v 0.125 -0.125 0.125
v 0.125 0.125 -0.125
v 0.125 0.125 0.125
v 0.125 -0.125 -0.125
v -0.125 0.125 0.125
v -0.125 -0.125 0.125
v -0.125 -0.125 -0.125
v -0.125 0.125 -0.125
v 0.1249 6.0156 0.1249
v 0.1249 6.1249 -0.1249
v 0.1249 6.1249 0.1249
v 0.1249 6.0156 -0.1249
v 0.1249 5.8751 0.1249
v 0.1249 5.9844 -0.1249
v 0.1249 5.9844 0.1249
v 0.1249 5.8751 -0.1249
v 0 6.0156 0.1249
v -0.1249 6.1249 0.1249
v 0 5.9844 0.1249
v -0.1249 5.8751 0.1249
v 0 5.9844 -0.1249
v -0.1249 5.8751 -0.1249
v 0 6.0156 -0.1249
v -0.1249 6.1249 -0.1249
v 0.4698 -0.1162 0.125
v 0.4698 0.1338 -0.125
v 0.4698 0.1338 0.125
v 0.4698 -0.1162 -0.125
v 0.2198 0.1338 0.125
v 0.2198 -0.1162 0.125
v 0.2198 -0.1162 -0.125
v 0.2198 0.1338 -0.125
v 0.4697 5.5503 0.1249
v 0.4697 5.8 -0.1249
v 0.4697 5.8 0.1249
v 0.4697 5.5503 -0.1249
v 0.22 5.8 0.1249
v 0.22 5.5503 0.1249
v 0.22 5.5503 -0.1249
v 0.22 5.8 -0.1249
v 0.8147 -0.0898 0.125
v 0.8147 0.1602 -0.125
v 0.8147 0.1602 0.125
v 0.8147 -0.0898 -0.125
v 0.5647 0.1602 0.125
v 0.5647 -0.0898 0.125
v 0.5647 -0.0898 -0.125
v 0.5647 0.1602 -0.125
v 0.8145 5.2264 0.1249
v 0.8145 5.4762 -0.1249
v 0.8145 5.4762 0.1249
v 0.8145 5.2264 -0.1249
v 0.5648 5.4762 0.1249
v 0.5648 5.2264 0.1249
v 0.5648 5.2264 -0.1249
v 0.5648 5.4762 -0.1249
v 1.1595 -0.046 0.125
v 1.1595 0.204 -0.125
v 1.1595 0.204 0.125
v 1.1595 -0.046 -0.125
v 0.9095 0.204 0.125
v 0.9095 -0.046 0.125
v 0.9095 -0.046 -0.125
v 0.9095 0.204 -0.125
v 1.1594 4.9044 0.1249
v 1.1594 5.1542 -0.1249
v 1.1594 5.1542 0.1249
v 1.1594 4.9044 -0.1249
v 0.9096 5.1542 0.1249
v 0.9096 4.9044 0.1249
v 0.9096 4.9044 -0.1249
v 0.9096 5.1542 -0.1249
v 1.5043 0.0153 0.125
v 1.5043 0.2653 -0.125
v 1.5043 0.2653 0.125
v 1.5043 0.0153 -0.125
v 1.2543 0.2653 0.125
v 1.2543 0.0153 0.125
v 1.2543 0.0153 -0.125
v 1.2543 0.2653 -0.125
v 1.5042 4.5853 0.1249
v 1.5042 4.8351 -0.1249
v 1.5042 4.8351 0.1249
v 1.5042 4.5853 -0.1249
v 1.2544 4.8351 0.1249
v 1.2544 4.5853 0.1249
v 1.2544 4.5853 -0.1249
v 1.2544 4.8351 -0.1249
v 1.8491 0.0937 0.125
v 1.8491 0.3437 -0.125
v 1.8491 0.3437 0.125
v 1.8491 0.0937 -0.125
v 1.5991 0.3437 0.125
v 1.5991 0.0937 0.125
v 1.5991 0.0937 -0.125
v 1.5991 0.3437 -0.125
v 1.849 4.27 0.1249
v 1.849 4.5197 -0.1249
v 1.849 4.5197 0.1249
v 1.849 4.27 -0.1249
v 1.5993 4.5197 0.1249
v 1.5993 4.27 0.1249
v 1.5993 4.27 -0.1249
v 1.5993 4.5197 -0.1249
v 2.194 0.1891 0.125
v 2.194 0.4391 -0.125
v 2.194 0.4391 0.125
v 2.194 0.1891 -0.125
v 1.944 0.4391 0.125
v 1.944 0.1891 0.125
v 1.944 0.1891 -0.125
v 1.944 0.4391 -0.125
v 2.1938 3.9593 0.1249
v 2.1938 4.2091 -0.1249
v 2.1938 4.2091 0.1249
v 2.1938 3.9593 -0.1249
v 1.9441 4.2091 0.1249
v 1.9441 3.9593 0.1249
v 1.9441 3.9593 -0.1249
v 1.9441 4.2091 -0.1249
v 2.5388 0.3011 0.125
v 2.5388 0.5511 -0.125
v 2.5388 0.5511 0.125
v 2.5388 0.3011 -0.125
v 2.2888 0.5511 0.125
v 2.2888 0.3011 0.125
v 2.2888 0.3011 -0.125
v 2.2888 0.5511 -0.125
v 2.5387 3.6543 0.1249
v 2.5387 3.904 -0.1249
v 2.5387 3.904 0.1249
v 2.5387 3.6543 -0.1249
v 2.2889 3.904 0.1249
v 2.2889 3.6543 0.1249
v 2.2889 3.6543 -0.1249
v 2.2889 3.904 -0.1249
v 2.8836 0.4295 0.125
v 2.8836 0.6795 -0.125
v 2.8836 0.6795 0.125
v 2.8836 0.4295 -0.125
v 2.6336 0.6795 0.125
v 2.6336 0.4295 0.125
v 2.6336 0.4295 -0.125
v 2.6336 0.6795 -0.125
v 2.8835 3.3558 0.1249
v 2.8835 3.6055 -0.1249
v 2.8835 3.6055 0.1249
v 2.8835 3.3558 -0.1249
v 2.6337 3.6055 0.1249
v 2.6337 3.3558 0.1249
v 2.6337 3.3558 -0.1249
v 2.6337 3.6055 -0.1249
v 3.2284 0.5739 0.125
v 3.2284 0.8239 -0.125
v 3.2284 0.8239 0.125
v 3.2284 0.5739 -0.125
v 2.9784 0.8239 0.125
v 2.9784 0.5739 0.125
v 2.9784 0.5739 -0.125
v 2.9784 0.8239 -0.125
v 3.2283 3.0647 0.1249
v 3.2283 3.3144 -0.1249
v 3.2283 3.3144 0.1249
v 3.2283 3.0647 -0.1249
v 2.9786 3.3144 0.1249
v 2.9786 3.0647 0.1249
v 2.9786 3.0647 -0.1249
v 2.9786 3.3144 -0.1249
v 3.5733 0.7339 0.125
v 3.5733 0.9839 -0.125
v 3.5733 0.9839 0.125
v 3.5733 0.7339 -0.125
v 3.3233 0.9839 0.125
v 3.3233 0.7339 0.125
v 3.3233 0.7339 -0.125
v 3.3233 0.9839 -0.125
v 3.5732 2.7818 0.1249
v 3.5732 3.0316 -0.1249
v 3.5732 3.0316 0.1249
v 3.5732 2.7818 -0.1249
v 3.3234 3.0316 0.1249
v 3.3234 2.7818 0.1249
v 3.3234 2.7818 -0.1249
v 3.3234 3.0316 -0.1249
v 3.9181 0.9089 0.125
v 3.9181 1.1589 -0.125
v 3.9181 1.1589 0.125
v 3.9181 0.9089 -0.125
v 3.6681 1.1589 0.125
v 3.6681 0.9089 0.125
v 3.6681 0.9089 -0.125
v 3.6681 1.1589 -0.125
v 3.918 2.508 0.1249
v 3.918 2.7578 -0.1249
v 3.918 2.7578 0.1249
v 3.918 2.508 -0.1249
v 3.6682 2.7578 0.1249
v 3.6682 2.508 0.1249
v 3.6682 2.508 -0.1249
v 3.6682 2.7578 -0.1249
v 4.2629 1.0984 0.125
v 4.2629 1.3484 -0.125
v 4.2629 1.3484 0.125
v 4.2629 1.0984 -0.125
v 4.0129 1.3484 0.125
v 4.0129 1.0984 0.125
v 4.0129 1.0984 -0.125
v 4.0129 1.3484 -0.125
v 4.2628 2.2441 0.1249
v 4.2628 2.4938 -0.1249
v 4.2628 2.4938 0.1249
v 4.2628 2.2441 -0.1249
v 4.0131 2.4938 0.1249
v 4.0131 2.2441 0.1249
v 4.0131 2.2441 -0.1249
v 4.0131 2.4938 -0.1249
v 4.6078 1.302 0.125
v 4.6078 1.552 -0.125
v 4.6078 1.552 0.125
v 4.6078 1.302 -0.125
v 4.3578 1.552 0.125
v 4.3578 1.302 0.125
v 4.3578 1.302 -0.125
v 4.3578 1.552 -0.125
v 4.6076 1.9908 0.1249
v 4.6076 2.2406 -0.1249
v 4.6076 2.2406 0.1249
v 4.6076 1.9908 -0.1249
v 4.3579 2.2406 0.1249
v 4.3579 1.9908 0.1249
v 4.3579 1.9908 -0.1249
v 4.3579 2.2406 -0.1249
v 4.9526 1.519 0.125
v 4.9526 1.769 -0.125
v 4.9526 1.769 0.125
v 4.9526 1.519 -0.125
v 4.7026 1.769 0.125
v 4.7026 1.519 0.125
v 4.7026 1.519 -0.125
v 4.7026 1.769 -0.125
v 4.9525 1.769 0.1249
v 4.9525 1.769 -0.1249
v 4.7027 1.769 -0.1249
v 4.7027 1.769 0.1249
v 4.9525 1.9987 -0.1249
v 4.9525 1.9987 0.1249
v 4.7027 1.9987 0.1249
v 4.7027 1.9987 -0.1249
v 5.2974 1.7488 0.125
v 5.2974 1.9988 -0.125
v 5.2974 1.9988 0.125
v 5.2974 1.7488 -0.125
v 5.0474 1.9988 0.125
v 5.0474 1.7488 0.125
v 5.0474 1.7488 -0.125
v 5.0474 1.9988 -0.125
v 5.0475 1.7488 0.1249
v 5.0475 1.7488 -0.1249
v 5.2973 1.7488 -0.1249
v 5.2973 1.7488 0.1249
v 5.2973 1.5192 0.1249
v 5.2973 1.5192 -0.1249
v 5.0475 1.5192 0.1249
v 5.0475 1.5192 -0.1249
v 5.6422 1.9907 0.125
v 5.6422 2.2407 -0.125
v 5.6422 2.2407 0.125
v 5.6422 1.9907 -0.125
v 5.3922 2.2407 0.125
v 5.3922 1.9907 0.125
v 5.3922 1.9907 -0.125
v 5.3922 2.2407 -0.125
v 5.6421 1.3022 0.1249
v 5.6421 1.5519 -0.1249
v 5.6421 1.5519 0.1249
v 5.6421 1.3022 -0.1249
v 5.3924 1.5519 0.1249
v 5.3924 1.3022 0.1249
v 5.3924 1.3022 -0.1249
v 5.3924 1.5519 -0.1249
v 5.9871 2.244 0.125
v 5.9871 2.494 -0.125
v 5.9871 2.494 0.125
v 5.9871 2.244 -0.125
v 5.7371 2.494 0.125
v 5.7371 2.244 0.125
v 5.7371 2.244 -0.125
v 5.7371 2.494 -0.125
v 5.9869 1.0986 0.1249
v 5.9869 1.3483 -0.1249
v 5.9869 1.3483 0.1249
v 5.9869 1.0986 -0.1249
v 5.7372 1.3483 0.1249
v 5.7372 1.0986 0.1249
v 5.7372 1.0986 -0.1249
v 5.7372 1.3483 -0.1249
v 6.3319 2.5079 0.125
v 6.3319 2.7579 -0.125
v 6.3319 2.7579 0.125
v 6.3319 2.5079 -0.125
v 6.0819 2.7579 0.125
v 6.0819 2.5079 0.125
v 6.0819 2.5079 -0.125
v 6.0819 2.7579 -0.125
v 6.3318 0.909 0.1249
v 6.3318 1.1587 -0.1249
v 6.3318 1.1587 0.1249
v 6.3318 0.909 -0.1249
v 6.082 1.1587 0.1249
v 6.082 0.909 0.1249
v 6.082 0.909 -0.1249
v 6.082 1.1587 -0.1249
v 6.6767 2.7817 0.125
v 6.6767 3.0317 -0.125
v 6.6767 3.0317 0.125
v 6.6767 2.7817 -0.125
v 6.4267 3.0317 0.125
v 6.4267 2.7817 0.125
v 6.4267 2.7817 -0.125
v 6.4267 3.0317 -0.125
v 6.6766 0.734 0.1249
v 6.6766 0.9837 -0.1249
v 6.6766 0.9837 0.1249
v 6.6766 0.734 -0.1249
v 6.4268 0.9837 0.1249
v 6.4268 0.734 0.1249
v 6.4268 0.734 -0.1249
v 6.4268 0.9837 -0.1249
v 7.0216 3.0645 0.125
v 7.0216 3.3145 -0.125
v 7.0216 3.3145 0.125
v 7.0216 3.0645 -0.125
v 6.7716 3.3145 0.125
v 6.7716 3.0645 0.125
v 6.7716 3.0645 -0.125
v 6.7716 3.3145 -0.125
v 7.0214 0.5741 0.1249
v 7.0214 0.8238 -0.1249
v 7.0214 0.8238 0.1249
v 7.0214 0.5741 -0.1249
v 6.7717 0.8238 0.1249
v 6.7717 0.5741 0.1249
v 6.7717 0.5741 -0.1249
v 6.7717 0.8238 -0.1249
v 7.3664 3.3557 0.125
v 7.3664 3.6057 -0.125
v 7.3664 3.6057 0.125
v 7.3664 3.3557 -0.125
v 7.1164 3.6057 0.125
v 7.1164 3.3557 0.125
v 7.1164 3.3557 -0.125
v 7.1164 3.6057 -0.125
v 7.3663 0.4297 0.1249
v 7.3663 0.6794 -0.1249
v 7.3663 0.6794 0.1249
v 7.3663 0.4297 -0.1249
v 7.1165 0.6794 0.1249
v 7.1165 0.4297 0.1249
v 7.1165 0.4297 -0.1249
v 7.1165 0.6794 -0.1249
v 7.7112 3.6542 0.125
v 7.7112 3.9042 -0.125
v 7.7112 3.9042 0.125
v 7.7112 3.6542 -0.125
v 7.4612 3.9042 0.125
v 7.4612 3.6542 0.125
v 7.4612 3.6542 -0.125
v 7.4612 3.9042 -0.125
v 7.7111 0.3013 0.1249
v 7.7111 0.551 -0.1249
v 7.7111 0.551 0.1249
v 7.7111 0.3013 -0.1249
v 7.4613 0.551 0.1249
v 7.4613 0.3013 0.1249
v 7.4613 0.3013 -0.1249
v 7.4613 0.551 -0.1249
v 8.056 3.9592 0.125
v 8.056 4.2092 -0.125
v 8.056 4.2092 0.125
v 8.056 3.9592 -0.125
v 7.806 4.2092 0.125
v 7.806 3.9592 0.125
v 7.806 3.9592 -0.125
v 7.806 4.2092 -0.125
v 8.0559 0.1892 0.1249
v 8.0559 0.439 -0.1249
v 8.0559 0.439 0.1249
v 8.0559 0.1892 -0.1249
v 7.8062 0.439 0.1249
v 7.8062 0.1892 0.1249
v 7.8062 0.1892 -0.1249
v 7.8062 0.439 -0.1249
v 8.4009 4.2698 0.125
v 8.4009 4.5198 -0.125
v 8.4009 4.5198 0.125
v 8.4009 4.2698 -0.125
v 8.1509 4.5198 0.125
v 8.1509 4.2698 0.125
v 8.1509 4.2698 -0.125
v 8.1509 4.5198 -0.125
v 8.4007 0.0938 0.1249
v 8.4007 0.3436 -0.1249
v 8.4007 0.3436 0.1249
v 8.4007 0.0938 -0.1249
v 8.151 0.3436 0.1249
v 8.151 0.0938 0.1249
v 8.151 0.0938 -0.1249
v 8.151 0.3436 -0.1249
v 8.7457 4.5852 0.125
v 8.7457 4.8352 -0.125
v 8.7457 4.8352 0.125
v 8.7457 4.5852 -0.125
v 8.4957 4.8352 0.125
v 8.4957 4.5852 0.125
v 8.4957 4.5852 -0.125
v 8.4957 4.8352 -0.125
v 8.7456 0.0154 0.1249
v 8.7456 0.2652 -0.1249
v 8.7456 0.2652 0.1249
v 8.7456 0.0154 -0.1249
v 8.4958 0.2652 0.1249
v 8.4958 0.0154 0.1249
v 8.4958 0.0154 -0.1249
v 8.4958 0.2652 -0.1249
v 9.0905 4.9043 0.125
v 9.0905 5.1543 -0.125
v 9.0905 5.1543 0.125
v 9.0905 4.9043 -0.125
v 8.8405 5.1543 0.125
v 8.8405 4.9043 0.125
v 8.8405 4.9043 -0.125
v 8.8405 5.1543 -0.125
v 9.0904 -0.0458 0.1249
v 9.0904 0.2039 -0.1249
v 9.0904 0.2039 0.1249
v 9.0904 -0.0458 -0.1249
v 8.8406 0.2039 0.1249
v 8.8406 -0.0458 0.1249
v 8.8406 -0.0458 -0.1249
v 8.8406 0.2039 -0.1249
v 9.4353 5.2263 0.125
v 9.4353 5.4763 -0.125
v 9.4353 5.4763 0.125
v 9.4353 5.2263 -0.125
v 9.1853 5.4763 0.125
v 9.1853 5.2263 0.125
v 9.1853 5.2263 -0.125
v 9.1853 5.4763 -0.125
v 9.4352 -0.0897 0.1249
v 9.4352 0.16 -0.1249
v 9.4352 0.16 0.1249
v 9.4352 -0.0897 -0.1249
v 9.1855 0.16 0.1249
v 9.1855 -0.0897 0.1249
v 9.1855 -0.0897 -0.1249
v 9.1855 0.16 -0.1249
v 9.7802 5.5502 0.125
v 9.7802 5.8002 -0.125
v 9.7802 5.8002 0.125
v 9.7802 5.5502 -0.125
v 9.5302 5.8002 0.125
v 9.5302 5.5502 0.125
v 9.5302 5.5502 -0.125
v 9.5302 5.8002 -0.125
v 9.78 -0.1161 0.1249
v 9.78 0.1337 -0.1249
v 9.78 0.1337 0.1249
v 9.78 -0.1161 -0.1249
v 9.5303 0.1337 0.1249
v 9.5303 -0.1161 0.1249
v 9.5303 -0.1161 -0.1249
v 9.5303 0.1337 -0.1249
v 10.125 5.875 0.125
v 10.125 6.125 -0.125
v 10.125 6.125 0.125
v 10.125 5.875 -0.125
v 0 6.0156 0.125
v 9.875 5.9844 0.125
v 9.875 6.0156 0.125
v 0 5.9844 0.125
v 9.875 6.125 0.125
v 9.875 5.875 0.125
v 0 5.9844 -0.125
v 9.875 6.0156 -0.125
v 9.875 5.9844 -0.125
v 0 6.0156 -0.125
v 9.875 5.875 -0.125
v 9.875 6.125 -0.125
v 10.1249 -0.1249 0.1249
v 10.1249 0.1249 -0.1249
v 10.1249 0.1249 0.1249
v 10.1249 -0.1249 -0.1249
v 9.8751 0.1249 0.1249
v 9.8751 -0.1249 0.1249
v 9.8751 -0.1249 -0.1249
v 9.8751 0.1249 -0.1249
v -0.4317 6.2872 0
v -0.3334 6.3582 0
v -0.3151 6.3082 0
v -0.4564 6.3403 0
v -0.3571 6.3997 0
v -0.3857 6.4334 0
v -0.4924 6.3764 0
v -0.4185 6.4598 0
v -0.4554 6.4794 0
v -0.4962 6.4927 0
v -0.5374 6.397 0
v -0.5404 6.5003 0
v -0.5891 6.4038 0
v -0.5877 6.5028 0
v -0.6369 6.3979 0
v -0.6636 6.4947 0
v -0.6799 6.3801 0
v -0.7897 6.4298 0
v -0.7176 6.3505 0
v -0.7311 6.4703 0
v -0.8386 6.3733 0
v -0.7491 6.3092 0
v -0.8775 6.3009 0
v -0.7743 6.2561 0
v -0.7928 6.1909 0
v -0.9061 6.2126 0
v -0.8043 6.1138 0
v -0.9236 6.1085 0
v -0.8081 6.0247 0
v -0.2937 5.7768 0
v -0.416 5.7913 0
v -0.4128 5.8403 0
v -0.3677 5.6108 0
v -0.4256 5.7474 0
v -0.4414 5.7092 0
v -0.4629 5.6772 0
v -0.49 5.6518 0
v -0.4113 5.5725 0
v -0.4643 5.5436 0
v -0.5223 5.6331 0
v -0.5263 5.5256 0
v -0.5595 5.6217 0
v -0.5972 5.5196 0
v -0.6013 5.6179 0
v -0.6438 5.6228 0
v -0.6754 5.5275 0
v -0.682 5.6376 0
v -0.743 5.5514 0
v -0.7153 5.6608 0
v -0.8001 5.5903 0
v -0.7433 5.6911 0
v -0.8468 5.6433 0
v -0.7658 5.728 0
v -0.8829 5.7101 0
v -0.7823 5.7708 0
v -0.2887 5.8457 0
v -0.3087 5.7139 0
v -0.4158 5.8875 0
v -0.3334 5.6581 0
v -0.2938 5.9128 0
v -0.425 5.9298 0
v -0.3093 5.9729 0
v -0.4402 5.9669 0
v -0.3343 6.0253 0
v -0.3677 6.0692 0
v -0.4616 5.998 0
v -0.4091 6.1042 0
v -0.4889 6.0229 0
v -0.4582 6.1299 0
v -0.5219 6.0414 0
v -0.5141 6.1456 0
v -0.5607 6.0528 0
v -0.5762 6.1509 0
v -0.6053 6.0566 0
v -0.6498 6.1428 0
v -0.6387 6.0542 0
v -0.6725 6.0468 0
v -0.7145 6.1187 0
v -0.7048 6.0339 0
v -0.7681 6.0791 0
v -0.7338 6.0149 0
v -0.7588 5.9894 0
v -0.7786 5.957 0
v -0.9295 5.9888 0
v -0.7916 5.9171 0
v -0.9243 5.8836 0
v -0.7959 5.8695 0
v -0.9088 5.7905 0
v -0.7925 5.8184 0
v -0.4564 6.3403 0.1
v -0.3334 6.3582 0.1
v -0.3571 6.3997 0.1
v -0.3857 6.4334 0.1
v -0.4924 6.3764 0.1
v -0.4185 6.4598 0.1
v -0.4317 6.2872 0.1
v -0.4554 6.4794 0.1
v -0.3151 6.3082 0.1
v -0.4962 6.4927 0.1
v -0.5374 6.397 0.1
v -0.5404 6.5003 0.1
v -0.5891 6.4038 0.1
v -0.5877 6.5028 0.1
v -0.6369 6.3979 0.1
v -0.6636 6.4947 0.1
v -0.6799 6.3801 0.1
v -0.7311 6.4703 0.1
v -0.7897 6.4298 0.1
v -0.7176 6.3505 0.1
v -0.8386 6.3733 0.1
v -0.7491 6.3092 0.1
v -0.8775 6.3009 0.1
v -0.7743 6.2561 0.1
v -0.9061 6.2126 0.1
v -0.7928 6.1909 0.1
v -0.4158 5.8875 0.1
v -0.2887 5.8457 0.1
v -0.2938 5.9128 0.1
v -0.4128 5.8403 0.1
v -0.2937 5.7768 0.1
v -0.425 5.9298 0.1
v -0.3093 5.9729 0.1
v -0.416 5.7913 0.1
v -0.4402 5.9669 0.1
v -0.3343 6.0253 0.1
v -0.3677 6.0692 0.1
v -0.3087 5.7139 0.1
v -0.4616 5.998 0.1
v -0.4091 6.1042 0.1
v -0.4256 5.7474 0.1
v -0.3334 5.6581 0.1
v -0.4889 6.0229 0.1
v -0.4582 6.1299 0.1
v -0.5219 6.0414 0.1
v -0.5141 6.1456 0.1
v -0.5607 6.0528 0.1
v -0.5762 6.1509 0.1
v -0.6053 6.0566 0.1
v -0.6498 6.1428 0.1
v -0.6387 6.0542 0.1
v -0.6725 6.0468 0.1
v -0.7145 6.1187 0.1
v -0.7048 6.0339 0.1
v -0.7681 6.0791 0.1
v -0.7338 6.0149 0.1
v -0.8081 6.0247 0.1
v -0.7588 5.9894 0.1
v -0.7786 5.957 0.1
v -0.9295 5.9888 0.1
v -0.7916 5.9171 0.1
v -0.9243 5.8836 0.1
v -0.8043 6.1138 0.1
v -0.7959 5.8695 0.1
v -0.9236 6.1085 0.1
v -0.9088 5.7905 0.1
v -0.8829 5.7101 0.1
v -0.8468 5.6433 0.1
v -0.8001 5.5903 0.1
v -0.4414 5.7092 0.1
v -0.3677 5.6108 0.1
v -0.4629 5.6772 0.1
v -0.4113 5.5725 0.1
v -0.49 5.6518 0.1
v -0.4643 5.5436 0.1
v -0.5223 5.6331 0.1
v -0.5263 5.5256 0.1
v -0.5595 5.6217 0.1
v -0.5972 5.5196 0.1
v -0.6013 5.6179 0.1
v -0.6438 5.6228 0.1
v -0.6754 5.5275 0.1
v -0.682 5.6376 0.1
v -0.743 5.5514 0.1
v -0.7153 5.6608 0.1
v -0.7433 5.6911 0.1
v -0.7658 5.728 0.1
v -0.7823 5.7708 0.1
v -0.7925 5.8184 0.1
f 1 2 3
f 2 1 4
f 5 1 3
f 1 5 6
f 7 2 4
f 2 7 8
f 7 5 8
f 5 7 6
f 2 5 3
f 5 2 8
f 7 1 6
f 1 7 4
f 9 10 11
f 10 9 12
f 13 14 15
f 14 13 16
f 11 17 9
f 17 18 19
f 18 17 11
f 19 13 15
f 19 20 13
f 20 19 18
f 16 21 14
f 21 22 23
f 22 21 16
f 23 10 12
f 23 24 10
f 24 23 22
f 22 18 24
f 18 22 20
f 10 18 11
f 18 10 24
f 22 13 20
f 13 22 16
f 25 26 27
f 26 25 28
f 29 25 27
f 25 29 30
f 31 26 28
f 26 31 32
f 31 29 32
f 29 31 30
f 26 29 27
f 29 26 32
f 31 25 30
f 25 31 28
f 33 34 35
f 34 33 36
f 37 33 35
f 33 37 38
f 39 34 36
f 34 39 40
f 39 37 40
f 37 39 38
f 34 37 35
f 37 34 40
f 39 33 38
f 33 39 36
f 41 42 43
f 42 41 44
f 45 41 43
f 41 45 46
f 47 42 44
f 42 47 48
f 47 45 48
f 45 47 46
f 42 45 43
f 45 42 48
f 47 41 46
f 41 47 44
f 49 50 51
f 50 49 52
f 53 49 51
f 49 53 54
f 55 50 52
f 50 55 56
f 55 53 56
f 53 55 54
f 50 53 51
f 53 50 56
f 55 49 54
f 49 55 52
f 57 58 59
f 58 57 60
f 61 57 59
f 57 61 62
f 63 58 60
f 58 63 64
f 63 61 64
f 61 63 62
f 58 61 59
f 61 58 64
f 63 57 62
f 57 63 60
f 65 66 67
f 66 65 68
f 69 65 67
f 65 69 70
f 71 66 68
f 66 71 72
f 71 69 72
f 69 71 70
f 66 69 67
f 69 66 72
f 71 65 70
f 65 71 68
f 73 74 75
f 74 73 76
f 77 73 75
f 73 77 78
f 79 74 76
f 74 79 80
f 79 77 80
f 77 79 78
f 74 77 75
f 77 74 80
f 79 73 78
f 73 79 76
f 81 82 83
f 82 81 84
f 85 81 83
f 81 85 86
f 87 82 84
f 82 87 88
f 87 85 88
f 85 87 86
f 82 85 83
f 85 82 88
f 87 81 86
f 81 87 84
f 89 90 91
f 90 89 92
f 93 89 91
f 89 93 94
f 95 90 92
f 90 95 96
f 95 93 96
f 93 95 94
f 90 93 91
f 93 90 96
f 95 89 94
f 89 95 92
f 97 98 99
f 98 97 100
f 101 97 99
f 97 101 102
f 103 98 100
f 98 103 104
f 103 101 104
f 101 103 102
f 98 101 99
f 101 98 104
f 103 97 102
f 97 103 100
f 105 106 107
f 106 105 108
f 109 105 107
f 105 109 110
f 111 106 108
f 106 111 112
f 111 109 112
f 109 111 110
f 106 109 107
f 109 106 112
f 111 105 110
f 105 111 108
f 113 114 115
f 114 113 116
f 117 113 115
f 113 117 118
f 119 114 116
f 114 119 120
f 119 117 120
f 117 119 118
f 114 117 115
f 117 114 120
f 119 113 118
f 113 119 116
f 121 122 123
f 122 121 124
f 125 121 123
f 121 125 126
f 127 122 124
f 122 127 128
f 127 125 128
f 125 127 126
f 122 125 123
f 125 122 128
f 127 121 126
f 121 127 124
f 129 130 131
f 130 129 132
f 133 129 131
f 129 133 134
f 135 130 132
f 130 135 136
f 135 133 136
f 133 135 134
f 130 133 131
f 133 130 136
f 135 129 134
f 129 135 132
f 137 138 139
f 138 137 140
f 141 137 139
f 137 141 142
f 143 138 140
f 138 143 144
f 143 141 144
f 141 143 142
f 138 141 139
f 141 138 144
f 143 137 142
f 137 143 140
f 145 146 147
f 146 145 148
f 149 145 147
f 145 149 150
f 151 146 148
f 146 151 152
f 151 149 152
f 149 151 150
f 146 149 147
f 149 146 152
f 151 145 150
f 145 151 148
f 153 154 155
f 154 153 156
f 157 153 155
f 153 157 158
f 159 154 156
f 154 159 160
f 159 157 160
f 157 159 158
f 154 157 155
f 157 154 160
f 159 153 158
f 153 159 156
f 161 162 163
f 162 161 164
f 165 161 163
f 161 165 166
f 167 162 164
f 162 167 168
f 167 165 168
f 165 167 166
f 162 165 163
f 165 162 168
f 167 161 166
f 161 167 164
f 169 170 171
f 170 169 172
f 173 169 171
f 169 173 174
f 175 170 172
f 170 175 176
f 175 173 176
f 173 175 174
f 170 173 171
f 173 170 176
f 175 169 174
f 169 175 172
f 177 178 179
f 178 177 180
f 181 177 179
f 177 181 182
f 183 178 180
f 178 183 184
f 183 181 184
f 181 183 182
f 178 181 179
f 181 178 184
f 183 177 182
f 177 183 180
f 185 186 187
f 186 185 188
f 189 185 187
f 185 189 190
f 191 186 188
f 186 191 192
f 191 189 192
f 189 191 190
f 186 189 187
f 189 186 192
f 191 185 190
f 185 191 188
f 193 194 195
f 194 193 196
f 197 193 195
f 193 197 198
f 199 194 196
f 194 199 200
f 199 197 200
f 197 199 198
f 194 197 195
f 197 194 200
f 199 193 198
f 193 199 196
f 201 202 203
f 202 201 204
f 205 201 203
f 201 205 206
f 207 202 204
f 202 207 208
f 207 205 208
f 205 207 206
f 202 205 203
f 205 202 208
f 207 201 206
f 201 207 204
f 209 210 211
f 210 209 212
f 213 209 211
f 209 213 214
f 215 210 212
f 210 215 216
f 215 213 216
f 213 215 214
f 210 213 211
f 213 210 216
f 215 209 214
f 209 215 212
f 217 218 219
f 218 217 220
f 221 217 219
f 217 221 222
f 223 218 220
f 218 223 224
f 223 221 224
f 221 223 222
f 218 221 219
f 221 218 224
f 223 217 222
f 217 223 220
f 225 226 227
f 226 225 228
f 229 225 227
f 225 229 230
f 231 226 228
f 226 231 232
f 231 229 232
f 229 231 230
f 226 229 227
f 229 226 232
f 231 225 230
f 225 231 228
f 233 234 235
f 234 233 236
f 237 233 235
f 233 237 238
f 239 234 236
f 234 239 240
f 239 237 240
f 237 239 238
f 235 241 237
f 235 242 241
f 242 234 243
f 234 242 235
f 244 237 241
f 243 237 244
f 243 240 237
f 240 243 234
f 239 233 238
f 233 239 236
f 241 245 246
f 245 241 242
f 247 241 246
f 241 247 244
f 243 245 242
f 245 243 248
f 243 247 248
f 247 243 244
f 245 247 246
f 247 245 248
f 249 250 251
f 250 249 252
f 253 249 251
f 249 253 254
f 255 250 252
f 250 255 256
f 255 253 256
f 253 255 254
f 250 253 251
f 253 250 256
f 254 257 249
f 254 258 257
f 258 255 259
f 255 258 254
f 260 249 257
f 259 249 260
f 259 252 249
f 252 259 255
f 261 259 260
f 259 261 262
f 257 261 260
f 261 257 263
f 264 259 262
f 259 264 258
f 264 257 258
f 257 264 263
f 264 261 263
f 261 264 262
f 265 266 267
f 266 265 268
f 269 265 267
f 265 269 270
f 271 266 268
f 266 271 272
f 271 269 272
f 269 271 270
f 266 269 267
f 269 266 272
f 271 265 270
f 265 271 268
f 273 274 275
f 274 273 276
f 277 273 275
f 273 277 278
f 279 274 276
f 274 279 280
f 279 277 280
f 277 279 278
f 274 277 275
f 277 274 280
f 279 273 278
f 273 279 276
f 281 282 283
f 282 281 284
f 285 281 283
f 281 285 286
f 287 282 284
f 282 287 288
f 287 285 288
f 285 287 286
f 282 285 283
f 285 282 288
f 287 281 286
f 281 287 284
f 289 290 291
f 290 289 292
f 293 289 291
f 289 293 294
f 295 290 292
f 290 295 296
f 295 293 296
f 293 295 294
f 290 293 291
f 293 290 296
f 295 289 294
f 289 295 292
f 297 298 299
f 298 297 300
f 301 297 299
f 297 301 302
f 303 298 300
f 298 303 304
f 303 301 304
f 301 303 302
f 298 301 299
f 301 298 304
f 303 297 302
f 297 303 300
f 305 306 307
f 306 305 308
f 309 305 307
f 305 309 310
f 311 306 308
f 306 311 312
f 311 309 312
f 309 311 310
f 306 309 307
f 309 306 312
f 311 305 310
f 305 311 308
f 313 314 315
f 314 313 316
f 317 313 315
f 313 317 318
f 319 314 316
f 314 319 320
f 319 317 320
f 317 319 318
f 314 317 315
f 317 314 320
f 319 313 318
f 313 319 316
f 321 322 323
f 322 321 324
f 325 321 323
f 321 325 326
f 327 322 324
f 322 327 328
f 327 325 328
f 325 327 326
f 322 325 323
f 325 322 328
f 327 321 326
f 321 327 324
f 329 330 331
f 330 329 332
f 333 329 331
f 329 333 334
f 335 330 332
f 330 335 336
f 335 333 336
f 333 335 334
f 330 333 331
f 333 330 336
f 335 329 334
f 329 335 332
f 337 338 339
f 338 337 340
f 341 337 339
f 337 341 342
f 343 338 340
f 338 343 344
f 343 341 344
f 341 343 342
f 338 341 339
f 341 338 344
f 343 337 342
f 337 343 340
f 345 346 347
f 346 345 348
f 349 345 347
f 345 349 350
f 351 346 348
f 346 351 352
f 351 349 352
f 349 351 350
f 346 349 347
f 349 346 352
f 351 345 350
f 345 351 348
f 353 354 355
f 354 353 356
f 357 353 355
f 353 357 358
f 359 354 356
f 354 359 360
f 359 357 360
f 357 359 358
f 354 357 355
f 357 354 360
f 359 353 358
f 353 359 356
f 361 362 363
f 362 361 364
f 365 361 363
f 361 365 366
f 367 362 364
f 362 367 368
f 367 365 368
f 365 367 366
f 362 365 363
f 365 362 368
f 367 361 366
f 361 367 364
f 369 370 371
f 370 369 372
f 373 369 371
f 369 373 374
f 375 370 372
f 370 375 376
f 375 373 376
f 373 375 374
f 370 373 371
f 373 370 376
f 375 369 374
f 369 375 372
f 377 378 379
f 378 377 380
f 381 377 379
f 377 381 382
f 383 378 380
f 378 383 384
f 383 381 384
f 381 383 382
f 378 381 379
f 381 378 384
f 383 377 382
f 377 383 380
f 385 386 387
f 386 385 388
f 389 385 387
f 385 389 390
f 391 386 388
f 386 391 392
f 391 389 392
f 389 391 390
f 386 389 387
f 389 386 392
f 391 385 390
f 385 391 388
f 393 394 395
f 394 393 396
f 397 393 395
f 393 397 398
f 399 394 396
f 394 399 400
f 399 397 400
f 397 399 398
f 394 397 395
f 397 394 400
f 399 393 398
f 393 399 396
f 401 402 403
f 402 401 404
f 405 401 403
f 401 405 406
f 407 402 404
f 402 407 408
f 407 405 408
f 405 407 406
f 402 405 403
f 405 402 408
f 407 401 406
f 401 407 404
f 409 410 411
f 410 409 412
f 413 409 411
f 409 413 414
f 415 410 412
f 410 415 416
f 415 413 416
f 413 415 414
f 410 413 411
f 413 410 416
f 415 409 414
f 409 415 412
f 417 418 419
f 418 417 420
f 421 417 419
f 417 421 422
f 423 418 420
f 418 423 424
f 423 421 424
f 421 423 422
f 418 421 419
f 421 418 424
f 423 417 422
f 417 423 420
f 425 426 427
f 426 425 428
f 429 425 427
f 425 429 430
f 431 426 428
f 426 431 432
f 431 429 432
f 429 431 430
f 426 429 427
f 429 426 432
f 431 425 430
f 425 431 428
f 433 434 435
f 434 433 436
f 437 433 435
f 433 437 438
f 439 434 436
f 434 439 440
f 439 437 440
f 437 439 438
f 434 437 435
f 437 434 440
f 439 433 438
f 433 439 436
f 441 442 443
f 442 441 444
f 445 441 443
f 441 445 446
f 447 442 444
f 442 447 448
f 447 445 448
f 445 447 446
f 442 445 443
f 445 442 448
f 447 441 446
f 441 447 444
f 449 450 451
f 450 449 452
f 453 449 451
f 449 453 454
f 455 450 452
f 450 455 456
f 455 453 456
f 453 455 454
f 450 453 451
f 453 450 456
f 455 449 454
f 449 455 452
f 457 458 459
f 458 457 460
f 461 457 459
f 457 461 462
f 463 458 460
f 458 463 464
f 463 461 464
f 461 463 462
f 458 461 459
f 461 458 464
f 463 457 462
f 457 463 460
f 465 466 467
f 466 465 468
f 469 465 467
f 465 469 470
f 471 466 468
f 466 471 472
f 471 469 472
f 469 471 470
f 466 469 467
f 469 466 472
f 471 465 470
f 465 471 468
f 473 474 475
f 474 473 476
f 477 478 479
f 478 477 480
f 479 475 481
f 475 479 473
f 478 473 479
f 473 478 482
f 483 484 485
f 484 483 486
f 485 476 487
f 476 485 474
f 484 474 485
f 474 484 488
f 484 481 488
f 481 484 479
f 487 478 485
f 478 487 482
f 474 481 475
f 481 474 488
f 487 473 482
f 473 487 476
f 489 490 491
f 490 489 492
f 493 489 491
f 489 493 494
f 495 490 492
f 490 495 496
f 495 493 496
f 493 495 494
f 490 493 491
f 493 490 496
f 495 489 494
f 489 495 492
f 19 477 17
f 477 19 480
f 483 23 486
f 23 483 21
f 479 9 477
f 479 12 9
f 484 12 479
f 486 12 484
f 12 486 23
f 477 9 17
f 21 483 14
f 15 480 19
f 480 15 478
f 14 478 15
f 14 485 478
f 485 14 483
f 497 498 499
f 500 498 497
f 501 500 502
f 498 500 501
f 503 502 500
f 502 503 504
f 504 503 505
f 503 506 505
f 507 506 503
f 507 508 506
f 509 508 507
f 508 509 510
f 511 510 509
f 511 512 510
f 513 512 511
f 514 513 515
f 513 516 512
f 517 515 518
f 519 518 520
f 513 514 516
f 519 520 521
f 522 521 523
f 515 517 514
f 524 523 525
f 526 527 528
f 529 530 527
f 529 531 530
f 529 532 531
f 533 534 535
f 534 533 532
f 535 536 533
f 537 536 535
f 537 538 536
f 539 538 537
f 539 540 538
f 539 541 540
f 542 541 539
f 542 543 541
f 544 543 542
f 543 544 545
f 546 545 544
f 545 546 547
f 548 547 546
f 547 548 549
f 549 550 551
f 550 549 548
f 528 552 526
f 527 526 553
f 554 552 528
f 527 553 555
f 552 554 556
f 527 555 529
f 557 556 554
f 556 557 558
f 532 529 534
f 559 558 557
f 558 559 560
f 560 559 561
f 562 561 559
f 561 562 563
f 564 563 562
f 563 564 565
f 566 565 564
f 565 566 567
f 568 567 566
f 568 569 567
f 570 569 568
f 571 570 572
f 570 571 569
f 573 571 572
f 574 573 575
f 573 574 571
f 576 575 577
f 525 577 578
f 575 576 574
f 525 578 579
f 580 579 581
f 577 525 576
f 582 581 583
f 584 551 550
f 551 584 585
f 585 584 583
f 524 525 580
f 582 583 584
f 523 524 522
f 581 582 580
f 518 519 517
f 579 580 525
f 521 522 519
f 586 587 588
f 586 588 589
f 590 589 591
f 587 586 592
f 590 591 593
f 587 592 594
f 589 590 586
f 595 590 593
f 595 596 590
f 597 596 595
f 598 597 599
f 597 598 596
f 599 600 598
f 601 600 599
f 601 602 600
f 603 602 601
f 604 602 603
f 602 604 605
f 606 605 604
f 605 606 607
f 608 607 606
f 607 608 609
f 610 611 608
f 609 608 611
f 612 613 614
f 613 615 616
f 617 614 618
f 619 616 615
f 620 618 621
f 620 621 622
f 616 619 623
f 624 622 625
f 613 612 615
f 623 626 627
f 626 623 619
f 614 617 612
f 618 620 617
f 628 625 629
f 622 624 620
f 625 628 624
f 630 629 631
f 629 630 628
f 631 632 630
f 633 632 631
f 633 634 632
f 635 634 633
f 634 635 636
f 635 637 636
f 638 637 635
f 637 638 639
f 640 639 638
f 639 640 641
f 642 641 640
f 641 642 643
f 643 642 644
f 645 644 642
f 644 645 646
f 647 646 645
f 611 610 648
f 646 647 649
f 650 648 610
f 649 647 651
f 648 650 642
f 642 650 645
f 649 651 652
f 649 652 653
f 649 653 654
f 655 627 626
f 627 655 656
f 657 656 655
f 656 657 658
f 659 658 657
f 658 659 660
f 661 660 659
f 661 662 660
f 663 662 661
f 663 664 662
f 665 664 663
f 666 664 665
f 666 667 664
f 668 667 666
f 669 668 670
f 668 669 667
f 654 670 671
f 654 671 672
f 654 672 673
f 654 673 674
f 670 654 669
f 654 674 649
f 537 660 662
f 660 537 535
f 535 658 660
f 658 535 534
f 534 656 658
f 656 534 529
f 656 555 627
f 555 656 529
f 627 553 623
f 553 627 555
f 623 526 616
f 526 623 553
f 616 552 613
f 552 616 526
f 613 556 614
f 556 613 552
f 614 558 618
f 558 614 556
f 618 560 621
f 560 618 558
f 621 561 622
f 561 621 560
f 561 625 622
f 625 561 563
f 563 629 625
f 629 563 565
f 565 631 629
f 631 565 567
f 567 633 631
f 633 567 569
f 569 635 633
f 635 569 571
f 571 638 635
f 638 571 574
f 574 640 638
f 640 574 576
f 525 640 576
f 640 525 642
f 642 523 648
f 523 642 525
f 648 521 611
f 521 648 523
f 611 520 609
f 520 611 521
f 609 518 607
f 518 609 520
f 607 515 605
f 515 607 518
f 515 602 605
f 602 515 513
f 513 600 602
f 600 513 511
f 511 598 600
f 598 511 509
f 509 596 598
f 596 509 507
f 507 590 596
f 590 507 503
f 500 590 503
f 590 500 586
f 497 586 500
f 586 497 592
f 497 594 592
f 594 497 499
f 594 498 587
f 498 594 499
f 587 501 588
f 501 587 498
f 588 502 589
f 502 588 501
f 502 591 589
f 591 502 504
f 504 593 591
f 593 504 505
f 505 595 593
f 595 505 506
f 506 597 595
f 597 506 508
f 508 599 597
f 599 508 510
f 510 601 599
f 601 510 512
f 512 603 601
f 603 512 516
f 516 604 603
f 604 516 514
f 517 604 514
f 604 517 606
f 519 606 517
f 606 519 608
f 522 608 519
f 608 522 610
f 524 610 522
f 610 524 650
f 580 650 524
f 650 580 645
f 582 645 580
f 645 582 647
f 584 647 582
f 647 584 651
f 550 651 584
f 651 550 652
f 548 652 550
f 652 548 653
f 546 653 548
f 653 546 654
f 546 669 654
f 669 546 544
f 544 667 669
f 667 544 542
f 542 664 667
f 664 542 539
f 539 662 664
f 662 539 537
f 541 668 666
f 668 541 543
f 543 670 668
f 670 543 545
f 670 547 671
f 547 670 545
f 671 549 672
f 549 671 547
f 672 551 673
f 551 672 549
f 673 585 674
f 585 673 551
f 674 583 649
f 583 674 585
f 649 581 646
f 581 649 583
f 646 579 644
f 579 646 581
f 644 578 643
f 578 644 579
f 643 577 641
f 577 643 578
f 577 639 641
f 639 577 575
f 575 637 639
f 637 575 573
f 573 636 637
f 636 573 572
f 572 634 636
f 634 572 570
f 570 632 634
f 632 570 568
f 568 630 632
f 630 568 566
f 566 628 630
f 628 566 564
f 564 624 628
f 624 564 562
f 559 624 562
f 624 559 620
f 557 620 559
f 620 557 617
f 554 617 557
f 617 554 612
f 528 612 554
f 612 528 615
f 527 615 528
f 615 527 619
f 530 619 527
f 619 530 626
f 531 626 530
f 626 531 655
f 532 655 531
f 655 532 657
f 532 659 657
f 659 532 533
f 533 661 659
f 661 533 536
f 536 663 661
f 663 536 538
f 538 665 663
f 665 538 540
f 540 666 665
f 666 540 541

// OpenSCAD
//interpolation functions

//starts at 0 and moves up to d
function f_plus(I, num_steps, d) =
let(t = 180 + 90*I/(num_steps-1))
d*cos(t) + d;

//starts at d and moves down to 0
function f_minus(I, num_steps, d) =
let(t = 180 + 90*I/(num_steps-1))
d*sin(t) + d;


//number of points to graph
steps = 30;

//the height of the interpolator and the radius of the
//interpolation circle
D = 6;

//vizualization parameter for how far the interpolator functions go to
to = 10;

//vizualization parameter for the size of the cubes
cube_size = 1/4;

//demo part variable
//switches which part of the demo is being viewed (0 or 1)
part = 0;

//graphing the functions based on iteration
if(part == 0){
    for(i = [0:steps-1]){
        
        plus = f_plus(i, steps, D);
        
        minus = f_minus(i, steps, D);
        
        x = to * i / (steps-1);
        
        translate([x, plus, 0])
        color([.8, .2, .2, .7])
        cube(size=cube_size, center=true);
        
        translate([x, minus, 0])
        color([.2, .2, .8, .7])
        cube(size=cube_size*.999, center=true);
           
    }

    translate([to/2, D, 0])
    color([.2, .9, .2, .6])
    cube([to, 1/32, 1/4], center=true);

    translate([-1, D, 0])
    color([.2, .9, .2, .6])
    linear_extrude(height=0.1)
    text(str(D), size=1, valign="center");
}

//graphing the functions parametrically
//to show that they follow the curve of a circle
//centered at [D, D]
else if(part == 1){
    for(i = [0:steps-1]){
        
        plus = f_plus(i, steps, D);
        
        minus = f_minus(i, steps, D);
        
        x = to * i / (steps-1);
        
        //plus is used as the x co-ordinate
        //minus is useds as the y co-ordinate
        translate([plus, minus, 0])
        color([.8, .2, .8, .7])
        cube(size=cube_size, center=true);
        
        translate([plus, minus/2, 0])
        color([.8, .2, .2, .7])
        cube(size=[1/32, minus, 1/4], center=true);
        
        translate([plus/2, minus, 0])
        color([.2, .2, .8, .7])
        cube(size=[plus, 1/32, 1/4], center=true);  
    }
    
    translate([D, D, 0])
    color([.1, .9, 0, .3])
    cylinder(r=D, h=1/2, center=true, $fn=100);   
}
